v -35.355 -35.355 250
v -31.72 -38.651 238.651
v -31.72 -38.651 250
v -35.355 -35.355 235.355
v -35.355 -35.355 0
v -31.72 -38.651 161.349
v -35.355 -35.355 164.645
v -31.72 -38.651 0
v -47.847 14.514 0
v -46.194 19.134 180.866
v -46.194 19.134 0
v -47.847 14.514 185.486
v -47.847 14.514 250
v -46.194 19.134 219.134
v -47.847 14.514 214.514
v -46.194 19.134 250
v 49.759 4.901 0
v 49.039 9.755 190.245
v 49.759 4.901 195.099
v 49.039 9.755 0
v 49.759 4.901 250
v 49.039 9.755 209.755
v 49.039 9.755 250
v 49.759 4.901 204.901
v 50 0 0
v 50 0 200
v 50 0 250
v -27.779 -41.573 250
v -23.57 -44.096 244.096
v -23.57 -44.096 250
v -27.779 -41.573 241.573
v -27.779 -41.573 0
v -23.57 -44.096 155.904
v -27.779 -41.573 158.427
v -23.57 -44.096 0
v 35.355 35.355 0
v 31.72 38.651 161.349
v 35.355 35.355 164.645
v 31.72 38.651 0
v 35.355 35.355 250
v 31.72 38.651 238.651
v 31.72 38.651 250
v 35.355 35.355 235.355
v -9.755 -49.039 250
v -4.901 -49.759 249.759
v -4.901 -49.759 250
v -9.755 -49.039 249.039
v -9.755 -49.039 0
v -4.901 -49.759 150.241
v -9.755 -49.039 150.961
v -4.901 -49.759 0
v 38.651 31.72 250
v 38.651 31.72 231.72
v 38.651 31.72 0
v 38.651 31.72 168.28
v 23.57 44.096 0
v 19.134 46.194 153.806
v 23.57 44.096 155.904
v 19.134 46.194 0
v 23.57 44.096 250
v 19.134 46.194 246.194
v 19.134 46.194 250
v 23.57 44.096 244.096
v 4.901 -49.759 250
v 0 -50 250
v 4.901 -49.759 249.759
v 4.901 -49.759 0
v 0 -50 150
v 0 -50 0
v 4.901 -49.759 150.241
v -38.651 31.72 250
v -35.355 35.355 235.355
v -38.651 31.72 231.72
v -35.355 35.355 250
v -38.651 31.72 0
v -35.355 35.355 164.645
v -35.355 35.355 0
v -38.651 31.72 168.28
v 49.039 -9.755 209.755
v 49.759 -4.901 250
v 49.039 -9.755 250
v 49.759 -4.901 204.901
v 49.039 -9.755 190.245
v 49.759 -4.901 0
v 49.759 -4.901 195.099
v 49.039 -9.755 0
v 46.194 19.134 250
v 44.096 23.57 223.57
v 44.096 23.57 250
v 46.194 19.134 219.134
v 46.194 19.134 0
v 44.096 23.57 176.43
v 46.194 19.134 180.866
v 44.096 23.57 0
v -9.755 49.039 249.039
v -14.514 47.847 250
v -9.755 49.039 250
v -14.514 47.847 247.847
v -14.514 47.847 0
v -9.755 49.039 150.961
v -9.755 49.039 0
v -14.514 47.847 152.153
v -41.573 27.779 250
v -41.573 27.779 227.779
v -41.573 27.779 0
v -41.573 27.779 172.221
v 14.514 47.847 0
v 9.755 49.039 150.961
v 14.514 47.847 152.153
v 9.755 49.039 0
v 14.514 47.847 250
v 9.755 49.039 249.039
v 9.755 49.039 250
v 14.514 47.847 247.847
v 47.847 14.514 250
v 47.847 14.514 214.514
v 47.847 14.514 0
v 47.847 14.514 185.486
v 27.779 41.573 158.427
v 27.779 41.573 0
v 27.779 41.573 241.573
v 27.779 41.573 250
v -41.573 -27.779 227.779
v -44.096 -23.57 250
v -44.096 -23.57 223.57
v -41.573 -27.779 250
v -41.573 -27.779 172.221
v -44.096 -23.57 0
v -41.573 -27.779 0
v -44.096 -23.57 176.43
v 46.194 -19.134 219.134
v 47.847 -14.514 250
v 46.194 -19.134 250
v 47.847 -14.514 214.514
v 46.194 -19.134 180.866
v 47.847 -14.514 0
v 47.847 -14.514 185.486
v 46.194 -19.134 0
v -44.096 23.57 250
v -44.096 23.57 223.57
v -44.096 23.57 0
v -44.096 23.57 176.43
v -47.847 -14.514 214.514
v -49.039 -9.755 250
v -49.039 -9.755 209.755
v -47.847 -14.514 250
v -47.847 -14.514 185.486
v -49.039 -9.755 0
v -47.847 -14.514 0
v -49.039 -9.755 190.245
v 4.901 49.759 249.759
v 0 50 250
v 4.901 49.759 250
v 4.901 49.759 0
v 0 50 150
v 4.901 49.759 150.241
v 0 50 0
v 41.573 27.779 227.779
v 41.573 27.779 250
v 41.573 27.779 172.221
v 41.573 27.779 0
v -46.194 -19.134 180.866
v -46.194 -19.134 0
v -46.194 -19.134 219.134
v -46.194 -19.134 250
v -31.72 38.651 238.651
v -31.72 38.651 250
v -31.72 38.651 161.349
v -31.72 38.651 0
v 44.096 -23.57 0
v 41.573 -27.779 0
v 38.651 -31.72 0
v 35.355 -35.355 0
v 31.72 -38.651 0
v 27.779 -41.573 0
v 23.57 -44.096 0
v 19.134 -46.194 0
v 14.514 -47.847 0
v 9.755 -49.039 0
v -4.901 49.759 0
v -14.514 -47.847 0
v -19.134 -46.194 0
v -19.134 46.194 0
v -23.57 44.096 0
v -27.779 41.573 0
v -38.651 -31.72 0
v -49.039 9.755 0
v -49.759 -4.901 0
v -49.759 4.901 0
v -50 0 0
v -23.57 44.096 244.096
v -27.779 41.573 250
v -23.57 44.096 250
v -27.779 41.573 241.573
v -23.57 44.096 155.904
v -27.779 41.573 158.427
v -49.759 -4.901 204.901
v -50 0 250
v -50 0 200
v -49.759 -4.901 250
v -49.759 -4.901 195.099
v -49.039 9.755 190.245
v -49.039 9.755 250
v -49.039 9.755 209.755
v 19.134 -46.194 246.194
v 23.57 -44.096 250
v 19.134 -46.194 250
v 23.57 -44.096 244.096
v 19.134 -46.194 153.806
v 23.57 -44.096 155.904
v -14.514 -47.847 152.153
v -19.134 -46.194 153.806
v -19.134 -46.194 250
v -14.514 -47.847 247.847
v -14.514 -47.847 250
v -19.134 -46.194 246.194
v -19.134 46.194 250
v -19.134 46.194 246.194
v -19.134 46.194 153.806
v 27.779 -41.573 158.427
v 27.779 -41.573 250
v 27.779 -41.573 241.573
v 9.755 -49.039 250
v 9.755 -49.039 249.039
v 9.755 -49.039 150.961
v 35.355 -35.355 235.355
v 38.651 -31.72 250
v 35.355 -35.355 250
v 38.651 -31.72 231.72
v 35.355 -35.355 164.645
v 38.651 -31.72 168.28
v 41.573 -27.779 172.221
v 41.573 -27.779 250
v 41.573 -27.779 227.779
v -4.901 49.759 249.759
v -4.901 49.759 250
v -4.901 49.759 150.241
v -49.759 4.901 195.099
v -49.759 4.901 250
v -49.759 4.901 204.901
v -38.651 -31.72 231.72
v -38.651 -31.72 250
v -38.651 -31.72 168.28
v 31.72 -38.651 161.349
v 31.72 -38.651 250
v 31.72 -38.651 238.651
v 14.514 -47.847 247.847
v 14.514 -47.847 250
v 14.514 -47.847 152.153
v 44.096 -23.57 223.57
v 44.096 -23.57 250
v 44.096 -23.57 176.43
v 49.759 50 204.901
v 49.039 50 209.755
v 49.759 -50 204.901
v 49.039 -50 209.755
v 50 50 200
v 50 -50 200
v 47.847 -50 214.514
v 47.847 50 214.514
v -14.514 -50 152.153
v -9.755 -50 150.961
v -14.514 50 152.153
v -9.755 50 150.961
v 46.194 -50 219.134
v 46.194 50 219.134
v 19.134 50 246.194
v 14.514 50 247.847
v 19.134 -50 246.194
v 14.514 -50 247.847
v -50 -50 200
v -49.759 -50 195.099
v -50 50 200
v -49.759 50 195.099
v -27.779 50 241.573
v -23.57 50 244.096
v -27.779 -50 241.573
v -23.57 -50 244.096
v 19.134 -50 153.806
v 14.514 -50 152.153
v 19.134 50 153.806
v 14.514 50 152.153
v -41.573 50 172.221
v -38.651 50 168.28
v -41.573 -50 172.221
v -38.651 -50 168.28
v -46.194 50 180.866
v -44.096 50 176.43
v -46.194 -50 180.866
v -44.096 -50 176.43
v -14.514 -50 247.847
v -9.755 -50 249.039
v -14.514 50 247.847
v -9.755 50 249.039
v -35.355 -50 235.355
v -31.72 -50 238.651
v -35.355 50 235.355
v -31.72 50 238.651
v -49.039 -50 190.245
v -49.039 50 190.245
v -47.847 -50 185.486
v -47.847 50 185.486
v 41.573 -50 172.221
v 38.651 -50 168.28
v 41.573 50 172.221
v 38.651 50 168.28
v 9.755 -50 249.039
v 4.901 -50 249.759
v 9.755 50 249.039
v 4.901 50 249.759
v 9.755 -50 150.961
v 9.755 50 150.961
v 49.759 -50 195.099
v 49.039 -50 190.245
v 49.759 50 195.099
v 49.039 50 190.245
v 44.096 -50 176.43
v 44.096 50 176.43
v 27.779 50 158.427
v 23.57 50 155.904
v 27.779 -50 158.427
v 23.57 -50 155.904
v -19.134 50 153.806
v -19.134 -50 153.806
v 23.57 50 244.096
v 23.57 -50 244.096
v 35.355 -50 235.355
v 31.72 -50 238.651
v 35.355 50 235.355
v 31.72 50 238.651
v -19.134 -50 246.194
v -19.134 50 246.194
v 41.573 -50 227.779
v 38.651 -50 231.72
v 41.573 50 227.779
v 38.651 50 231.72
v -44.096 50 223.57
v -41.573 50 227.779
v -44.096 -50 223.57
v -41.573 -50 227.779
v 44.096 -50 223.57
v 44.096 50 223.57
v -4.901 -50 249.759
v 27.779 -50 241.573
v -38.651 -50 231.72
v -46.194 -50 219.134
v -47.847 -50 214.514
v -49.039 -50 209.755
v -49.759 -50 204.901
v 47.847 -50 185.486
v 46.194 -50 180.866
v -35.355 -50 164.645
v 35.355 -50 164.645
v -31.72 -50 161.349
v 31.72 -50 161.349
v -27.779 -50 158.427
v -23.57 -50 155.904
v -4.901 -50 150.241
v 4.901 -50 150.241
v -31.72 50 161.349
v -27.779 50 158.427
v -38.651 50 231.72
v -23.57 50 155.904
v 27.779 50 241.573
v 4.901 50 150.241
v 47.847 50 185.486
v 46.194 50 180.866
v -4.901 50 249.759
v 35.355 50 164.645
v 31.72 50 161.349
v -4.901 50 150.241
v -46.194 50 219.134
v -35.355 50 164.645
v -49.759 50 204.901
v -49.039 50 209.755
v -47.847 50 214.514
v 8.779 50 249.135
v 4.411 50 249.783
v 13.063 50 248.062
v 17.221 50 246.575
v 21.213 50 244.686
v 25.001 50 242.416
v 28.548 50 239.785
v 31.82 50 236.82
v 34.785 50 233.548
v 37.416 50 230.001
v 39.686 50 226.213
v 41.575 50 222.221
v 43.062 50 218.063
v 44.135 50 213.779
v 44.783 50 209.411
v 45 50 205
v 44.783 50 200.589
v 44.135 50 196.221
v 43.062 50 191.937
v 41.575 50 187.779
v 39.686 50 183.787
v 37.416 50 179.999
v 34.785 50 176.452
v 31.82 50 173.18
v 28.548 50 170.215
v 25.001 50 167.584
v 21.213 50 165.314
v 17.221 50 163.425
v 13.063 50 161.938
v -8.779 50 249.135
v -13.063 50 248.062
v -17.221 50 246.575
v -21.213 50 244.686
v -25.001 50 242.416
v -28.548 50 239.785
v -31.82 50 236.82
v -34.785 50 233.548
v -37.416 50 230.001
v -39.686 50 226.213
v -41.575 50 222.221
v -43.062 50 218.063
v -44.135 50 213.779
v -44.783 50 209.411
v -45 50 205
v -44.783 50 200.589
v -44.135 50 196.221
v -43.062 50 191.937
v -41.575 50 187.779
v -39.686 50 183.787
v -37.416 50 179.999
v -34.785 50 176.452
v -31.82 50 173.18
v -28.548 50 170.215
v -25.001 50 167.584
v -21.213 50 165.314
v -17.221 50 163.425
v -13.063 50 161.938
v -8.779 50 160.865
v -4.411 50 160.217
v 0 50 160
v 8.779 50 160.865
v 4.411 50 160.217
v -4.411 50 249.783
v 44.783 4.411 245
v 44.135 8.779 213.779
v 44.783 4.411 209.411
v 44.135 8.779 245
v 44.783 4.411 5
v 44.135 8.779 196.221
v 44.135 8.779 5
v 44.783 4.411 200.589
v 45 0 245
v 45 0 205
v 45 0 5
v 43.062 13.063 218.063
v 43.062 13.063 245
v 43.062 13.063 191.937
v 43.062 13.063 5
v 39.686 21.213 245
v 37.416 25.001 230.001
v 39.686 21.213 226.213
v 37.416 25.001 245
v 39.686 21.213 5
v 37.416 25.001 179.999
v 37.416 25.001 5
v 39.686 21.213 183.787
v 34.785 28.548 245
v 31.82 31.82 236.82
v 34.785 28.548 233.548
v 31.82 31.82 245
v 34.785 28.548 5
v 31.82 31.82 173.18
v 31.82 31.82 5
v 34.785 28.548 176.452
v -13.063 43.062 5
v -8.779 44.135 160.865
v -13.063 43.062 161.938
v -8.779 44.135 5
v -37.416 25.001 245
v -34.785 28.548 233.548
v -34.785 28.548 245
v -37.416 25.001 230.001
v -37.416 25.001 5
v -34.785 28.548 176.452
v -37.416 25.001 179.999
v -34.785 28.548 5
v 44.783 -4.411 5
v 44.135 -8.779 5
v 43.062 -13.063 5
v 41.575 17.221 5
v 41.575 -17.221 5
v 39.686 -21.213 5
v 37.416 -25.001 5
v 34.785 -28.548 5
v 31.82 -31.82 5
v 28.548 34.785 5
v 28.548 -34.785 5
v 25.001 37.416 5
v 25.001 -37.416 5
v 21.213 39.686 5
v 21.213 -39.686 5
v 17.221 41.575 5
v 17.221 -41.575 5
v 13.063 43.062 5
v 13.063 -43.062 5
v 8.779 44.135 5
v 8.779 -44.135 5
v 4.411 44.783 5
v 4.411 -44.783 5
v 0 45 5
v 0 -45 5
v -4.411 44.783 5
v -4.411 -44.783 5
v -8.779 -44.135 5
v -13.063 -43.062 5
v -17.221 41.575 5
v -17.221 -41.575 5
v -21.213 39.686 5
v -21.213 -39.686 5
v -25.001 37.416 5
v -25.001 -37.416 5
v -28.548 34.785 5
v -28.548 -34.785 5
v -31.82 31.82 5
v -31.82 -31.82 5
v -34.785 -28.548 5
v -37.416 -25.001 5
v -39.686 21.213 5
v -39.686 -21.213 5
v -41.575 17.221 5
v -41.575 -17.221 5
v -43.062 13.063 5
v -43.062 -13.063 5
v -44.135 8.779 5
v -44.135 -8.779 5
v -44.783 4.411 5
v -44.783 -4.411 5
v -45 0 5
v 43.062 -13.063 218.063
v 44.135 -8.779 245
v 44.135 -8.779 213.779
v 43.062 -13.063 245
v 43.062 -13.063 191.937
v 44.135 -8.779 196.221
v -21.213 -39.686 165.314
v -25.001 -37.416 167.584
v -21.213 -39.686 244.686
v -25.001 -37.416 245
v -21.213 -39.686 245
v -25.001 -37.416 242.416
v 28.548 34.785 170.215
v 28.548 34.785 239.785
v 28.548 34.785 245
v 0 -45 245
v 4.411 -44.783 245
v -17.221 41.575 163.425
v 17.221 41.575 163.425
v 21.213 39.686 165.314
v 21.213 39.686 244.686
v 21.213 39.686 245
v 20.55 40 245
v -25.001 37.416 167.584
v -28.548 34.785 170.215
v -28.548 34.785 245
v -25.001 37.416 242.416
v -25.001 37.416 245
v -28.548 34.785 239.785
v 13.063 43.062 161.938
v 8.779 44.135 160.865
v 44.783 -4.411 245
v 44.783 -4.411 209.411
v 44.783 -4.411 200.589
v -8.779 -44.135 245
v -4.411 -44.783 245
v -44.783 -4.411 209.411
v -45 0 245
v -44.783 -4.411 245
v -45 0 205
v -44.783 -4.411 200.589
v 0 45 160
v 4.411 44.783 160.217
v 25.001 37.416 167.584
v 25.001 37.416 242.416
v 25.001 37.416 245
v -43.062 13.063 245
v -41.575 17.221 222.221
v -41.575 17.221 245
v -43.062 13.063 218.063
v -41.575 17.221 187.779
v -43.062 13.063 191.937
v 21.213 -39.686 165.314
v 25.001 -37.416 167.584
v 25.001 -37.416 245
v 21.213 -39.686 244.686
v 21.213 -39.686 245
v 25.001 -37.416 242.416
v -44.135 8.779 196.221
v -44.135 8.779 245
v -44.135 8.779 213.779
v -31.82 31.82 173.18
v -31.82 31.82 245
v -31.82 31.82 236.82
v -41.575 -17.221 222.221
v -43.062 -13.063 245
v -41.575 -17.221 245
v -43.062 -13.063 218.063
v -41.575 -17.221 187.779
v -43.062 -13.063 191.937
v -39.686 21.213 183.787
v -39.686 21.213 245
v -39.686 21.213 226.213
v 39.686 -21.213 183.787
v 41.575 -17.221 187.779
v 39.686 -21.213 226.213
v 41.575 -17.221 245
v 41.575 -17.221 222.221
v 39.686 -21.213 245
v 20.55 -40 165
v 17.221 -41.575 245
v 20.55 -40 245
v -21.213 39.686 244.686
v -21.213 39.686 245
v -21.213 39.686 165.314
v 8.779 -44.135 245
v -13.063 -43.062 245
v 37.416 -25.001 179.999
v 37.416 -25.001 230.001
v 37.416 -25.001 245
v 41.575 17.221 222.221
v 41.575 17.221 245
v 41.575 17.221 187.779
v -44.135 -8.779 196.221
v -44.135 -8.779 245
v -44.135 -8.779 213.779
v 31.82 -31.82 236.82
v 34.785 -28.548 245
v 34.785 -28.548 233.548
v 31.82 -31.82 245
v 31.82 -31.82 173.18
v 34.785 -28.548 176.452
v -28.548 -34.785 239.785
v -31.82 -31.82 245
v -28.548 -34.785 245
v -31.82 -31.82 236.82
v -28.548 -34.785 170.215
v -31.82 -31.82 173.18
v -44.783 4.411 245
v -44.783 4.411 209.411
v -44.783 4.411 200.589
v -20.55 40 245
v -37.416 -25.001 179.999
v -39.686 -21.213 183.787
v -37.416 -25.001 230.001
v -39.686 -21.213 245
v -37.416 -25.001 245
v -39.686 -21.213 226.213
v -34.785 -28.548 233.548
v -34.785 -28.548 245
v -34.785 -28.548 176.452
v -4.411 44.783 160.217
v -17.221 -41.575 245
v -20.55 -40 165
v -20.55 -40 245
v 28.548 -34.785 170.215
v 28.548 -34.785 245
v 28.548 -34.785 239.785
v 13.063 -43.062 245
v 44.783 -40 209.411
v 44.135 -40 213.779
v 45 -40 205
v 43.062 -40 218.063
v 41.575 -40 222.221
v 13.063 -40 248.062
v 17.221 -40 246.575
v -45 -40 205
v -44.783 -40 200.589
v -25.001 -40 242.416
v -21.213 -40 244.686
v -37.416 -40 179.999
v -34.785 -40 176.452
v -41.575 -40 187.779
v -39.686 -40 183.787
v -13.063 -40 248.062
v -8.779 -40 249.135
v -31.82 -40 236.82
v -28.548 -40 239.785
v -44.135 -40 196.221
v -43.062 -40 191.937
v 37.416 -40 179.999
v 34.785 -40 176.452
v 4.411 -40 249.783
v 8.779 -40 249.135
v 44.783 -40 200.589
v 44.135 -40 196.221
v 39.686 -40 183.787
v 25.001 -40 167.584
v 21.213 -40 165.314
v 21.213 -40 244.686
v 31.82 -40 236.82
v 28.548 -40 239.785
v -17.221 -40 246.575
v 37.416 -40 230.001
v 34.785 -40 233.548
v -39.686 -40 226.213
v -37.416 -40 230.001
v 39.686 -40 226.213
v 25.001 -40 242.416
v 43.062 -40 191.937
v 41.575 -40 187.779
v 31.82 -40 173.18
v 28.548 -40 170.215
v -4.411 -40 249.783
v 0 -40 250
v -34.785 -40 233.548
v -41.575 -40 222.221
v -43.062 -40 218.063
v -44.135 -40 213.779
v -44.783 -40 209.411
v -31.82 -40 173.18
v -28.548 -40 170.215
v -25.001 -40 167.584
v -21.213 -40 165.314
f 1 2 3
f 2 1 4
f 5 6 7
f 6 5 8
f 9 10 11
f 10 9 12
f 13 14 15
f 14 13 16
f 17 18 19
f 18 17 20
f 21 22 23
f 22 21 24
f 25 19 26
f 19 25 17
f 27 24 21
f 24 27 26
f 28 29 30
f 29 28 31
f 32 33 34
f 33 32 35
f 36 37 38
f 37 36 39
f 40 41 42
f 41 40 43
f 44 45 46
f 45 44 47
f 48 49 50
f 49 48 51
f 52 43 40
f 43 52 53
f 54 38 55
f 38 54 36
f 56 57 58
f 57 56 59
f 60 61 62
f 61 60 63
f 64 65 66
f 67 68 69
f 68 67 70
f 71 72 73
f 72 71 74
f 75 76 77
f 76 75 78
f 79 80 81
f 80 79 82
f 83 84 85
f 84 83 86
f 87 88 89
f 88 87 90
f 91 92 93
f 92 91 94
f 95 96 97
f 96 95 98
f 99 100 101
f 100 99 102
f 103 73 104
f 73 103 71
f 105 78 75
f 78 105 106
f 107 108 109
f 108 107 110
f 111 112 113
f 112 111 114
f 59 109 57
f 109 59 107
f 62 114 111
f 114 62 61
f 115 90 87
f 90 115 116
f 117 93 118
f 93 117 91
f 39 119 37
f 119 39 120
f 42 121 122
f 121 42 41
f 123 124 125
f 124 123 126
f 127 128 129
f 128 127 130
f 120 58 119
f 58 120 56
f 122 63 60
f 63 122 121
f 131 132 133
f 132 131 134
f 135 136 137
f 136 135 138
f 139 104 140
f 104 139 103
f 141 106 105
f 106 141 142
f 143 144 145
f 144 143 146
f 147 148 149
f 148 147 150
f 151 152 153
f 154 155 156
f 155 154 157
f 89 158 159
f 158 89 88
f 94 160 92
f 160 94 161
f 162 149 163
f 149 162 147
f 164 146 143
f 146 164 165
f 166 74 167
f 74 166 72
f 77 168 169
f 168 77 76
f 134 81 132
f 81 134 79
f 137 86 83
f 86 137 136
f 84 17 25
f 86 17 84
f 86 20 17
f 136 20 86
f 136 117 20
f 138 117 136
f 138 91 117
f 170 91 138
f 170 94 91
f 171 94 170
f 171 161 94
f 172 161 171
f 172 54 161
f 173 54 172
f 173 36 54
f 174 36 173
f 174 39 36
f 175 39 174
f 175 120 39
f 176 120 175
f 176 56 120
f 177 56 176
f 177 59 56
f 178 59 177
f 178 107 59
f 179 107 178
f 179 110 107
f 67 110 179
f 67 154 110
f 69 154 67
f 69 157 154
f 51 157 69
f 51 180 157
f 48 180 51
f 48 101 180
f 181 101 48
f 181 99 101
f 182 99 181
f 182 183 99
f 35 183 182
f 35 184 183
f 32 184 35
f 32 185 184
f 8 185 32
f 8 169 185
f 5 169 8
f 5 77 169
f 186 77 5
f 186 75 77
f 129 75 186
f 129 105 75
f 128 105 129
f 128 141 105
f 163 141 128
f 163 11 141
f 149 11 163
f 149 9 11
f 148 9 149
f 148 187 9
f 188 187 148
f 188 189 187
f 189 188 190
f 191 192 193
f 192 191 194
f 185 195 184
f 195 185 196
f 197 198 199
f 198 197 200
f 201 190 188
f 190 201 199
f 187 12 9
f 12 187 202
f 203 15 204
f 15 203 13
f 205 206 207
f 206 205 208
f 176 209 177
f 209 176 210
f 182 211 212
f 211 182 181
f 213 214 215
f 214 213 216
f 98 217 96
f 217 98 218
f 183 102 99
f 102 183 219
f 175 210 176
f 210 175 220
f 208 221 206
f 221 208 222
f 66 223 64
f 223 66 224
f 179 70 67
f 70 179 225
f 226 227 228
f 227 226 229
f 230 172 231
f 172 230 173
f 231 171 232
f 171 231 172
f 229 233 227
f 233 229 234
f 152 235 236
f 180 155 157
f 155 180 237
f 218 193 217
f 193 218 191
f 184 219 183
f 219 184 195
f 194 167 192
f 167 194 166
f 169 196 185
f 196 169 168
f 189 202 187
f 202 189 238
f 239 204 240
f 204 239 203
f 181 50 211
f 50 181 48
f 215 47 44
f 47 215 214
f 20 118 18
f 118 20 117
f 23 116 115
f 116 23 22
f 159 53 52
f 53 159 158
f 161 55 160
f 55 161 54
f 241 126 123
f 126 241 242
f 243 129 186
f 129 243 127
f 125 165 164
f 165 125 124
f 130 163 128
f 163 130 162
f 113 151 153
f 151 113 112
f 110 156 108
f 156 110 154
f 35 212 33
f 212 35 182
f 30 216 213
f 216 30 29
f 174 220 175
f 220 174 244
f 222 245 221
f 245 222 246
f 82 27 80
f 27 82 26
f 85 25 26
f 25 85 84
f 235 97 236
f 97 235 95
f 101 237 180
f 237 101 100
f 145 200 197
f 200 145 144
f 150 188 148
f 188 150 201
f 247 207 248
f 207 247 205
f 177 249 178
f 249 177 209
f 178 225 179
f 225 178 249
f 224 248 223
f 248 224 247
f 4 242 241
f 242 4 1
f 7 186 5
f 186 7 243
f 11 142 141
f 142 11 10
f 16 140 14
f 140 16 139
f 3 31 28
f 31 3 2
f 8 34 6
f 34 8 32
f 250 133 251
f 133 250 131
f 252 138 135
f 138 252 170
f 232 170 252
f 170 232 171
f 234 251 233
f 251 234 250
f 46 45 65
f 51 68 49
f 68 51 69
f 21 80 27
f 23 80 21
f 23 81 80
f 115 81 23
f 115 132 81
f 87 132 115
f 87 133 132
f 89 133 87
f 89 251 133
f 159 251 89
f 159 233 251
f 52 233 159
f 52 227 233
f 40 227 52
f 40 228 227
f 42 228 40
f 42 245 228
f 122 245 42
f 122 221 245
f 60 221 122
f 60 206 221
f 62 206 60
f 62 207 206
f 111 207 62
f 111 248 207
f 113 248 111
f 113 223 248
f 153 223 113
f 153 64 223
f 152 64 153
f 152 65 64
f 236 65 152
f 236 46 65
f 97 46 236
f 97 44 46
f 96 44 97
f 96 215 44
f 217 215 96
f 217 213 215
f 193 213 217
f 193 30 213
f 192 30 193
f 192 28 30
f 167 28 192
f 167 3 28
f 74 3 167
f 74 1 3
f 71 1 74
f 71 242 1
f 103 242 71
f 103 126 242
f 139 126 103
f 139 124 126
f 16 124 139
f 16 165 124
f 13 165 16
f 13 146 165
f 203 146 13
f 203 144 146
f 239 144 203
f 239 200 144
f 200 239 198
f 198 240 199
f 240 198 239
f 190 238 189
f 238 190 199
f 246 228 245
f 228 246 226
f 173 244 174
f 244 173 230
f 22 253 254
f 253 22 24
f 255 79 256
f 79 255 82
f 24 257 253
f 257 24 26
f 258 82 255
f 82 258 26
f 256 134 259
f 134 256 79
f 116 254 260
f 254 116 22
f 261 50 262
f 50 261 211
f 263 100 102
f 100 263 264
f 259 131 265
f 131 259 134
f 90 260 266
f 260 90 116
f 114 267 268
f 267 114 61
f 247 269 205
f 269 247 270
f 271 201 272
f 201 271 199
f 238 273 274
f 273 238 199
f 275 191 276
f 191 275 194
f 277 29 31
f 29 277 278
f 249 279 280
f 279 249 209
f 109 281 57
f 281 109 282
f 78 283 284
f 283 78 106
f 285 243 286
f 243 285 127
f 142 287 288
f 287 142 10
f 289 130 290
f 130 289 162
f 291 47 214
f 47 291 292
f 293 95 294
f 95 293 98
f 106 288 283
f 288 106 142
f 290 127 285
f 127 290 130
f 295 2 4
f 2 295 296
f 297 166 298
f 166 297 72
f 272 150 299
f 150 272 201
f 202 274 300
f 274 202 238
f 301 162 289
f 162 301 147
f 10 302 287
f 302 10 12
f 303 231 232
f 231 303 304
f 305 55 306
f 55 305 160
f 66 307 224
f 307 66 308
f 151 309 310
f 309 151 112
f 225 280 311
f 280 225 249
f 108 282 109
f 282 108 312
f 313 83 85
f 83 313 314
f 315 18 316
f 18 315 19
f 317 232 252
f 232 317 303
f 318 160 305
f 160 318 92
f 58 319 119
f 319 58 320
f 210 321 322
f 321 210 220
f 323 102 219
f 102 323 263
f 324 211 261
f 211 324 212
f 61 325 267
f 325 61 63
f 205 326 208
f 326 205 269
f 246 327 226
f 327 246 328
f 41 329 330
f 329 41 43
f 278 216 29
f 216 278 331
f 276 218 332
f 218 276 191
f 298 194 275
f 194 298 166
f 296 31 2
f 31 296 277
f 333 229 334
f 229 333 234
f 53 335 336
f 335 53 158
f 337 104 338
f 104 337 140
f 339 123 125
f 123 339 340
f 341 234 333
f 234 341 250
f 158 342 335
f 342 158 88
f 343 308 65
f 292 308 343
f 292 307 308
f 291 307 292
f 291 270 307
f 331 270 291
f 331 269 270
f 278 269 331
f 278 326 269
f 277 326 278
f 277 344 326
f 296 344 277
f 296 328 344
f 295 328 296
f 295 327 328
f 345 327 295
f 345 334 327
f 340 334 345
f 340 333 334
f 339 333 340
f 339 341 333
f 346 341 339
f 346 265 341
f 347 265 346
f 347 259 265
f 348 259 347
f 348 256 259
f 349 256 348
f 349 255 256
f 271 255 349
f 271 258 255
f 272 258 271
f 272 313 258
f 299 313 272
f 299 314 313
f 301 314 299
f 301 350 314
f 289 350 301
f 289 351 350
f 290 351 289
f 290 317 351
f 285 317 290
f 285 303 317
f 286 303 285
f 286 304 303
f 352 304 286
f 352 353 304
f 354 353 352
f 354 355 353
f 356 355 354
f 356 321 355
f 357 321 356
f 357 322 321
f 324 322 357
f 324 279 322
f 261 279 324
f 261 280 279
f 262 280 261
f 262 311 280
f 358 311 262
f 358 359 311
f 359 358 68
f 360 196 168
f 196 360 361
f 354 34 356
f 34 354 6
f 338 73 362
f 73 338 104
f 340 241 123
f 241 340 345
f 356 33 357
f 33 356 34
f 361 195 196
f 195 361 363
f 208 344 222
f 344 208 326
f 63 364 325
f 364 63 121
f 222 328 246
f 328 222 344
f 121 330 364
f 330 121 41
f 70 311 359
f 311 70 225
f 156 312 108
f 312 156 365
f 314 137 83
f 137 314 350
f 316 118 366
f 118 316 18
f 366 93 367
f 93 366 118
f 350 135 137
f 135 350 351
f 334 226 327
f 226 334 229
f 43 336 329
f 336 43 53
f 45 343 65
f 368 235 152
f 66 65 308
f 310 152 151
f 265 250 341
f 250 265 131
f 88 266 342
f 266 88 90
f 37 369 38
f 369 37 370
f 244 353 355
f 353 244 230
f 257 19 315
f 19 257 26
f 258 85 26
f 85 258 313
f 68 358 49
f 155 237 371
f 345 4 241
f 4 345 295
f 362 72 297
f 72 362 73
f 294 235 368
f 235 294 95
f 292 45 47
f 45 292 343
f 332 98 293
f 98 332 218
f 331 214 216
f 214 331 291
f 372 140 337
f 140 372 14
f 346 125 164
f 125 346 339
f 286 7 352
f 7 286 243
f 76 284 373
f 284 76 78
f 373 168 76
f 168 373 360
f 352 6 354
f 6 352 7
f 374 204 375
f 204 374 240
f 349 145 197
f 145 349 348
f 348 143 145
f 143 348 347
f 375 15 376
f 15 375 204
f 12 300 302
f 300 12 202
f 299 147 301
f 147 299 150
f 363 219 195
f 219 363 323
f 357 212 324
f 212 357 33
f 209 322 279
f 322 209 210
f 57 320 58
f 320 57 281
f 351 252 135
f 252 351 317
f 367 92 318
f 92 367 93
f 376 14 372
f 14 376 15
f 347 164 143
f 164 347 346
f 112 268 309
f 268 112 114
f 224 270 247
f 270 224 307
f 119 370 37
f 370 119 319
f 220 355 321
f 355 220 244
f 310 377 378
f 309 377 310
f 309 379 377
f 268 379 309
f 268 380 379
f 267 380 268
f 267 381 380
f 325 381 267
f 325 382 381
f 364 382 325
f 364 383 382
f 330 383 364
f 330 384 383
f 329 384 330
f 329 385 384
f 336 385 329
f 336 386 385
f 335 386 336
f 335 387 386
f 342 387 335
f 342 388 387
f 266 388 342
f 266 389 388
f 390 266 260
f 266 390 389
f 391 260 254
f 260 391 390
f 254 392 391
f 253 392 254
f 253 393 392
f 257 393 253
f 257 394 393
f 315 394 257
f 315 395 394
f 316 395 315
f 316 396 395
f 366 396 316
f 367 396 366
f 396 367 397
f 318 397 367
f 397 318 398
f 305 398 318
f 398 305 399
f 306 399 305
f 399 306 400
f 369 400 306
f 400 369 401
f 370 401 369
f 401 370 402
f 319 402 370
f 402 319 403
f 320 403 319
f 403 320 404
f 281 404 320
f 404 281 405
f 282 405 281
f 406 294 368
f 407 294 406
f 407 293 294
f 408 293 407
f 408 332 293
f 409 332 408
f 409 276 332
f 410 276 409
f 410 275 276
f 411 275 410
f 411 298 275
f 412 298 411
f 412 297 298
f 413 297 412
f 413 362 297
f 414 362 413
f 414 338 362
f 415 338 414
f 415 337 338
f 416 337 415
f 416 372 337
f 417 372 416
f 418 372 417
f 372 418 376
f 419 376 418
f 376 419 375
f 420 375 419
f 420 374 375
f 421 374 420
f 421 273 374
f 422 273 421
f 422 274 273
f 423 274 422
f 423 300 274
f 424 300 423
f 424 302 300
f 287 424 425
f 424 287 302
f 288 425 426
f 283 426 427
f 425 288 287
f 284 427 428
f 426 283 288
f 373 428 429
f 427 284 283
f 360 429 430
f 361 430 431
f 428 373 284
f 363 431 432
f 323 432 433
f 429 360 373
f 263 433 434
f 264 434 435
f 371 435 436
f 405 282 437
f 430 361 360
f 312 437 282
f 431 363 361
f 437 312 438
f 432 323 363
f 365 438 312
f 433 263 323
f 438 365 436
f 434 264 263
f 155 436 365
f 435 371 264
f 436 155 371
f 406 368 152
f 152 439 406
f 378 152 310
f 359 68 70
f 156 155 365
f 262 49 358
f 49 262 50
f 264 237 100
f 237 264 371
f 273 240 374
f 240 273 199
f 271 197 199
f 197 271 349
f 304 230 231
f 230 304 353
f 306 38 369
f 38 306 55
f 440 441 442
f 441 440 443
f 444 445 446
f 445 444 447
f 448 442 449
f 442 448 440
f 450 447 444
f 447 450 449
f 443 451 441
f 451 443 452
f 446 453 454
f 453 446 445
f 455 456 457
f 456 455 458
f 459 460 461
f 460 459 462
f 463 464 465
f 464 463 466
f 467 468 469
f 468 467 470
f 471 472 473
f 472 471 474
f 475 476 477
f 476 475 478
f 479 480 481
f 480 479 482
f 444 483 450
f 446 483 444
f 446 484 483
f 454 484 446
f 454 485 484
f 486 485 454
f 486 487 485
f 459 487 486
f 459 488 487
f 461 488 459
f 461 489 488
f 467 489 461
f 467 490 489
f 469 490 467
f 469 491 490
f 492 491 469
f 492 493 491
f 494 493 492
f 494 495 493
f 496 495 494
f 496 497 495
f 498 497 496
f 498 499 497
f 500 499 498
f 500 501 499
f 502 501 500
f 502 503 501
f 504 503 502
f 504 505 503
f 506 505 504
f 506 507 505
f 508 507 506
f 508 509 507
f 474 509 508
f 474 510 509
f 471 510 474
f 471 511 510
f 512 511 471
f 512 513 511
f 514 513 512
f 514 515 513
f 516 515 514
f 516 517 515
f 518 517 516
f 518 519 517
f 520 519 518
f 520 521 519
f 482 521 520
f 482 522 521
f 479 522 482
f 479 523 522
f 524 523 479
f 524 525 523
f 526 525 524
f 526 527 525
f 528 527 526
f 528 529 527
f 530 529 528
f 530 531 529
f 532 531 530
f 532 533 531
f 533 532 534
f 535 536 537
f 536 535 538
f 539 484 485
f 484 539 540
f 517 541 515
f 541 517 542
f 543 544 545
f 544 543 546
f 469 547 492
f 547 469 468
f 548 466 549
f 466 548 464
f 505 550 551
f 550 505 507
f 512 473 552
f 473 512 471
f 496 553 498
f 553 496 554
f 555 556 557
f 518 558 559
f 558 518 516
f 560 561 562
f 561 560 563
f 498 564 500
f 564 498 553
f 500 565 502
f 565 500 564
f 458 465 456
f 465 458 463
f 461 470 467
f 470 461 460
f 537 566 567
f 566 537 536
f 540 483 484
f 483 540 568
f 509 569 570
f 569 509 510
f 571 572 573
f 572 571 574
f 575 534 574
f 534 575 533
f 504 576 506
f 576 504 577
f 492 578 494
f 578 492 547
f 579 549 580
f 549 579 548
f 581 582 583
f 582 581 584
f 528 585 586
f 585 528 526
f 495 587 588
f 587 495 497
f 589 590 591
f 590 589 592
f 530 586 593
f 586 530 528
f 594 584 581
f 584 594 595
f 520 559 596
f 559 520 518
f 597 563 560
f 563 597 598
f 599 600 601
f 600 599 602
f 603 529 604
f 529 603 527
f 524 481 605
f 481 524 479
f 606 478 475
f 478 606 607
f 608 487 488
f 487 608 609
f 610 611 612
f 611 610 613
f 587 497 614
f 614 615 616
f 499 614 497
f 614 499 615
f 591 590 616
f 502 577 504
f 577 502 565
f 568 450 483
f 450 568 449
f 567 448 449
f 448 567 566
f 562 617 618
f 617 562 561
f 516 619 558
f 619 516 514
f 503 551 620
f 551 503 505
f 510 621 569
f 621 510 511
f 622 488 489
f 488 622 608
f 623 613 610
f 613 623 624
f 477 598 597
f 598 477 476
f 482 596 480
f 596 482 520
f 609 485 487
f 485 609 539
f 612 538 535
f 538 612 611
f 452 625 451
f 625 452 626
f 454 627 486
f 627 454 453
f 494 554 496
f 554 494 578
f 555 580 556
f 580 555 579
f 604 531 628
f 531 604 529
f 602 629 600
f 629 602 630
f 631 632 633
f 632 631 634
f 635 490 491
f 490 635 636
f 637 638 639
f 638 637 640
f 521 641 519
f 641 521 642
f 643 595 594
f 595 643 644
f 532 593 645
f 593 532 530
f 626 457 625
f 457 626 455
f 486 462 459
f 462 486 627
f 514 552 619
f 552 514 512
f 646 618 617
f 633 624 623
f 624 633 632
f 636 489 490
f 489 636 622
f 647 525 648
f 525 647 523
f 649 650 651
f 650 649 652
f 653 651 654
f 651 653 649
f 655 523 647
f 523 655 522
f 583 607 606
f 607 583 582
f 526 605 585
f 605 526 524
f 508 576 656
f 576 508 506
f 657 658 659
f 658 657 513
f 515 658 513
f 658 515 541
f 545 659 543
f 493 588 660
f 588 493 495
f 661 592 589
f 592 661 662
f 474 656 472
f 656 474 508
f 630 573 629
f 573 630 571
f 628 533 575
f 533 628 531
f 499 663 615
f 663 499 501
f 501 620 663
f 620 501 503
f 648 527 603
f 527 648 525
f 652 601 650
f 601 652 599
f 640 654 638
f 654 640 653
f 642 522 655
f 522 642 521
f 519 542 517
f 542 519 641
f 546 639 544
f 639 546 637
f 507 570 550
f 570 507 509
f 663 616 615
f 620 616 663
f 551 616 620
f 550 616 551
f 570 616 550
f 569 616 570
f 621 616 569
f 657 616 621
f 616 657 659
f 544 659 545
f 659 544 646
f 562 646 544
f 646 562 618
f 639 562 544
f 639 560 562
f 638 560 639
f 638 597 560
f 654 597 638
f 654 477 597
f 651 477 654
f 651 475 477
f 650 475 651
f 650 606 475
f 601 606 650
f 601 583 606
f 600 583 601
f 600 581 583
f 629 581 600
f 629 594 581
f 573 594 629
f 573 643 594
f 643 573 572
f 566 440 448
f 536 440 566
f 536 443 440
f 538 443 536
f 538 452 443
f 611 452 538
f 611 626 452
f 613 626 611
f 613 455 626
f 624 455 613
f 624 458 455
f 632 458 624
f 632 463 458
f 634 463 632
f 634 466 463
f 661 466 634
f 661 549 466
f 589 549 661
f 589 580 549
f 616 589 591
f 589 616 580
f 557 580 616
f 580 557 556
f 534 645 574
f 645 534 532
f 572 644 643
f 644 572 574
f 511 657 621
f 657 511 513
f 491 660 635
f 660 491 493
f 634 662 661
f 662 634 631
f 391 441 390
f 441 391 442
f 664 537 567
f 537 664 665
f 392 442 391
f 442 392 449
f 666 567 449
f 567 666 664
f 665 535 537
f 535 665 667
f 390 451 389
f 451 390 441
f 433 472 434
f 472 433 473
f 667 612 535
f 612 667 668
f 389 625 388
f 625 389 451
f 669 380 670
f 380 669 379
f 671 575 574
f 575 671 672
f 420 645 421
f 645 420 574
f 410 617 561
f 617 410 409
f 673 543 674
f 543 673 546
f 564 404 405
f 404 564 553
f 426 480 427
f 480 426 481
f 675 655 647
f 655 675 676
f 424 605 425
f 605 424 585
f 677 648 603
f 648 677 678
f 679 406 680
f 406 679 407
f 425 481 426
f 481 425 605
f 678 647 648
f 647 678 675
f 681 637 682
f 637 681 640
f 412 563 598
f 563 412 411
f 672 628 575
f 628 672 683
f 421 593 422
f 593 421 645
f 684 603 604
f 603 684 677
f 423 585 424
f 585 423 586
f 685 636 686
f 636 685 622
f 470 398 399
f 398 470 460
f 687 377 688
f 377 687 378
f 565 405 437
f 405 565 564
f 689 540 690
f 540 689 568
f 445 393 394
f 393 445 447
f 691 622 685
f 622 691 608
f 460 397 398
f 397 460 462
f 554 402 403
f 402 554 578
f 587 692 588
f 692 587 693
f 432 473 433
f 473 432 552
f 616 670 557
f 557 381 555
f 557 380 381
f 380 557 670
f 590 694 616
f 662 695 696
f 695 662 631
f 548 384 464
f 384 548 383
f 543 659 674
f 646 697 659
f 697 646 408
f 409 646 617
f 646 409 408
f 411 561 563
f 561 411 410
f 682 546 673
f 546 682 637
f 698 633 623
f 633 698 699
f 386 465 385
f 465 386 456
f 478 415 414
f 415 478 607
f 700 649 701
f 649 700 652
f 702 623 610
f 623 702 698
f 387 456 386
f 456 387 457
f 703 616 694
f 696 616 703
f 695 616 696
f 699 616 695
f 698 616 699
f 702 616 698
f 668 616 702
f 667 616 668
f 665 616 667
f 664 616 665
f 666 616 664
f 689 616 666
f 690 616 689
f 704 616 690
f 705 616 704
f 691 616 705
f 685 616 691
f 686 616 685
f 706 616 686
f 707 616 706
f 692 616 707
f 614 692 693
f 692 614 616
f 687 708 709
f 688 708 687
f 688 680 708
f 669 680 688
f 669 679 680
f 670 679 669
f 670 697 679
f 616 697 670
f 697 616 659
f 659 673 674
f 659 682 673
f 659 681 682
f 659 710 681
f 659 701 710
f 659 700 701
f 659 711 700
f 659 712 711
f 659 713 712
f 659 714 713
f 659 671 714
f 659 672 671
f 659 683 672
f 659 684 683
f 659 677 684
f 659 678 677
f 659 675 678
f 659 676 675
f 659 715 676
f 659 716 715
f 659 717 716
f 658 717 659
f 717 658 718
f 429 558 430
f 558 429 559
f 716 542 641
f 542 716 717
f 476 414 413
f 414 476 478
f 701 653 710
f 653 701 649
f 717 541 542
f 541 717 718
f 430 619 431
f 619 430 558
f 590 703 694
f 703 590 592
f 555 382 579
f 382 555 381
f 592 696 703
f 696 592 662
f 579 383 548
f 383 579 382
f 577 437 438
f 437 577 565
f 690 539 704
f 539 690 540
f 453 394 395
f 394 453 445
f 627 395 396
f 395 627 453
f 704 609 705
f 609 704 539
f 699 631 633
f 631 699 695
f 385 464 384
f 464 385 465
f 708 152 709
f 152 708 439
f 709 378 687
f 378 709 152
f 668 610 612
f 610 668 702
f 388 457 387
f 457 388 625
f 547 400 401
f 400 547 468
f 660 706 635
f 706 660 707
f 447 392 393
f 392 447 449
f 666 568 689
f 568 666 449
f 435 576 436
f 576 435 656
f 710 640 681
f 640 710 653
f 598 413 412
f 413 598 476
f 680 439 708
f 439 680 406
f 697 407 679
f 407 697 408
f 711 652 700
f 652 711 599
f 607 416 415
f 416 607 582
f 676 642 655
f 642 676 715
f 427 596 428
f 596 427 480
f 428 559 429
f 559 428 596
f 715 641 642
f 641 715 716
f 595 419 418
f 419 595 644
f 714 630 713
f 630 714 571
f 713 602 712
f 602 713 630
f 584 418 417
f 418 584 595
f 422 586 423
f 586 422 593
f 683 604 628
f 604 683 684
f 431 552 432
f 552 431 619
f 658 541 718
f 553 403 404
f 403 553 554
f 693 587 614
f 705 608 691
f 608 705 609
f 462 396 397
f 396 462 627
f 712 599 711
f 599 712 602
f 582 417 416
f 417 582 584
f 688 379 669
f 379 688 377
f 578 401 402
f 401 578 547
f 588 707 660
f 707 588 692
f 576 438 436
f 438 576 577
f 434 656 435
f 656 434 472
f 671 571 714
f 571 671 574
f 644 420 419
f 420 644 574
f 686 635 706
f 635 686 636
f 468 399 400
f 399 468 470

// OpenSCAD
module ht_90_pipe() {
    difference() {
        union() {
            // Main pipe
            cylinder(h=250, r=50, $fn=64);
            // Elbow pipe
            translate([0, 50, 200])
                rotate([90, 0, 0])
                cylinder(h=100, r=50, $fn=64);
        }
        // Inner hollow
        union() {
            // Main pipe hollow
            translate([0, 0, 5])
                cylinder(h=240, r=45, $fn=64);
            // Elbow pipe hollow
            translate([0, 50, 205])
                rotate([90, 0, 0])
                cylinder(h=90, r=45, $fn=64);
        }
    }
}

ht_90_pipe();
